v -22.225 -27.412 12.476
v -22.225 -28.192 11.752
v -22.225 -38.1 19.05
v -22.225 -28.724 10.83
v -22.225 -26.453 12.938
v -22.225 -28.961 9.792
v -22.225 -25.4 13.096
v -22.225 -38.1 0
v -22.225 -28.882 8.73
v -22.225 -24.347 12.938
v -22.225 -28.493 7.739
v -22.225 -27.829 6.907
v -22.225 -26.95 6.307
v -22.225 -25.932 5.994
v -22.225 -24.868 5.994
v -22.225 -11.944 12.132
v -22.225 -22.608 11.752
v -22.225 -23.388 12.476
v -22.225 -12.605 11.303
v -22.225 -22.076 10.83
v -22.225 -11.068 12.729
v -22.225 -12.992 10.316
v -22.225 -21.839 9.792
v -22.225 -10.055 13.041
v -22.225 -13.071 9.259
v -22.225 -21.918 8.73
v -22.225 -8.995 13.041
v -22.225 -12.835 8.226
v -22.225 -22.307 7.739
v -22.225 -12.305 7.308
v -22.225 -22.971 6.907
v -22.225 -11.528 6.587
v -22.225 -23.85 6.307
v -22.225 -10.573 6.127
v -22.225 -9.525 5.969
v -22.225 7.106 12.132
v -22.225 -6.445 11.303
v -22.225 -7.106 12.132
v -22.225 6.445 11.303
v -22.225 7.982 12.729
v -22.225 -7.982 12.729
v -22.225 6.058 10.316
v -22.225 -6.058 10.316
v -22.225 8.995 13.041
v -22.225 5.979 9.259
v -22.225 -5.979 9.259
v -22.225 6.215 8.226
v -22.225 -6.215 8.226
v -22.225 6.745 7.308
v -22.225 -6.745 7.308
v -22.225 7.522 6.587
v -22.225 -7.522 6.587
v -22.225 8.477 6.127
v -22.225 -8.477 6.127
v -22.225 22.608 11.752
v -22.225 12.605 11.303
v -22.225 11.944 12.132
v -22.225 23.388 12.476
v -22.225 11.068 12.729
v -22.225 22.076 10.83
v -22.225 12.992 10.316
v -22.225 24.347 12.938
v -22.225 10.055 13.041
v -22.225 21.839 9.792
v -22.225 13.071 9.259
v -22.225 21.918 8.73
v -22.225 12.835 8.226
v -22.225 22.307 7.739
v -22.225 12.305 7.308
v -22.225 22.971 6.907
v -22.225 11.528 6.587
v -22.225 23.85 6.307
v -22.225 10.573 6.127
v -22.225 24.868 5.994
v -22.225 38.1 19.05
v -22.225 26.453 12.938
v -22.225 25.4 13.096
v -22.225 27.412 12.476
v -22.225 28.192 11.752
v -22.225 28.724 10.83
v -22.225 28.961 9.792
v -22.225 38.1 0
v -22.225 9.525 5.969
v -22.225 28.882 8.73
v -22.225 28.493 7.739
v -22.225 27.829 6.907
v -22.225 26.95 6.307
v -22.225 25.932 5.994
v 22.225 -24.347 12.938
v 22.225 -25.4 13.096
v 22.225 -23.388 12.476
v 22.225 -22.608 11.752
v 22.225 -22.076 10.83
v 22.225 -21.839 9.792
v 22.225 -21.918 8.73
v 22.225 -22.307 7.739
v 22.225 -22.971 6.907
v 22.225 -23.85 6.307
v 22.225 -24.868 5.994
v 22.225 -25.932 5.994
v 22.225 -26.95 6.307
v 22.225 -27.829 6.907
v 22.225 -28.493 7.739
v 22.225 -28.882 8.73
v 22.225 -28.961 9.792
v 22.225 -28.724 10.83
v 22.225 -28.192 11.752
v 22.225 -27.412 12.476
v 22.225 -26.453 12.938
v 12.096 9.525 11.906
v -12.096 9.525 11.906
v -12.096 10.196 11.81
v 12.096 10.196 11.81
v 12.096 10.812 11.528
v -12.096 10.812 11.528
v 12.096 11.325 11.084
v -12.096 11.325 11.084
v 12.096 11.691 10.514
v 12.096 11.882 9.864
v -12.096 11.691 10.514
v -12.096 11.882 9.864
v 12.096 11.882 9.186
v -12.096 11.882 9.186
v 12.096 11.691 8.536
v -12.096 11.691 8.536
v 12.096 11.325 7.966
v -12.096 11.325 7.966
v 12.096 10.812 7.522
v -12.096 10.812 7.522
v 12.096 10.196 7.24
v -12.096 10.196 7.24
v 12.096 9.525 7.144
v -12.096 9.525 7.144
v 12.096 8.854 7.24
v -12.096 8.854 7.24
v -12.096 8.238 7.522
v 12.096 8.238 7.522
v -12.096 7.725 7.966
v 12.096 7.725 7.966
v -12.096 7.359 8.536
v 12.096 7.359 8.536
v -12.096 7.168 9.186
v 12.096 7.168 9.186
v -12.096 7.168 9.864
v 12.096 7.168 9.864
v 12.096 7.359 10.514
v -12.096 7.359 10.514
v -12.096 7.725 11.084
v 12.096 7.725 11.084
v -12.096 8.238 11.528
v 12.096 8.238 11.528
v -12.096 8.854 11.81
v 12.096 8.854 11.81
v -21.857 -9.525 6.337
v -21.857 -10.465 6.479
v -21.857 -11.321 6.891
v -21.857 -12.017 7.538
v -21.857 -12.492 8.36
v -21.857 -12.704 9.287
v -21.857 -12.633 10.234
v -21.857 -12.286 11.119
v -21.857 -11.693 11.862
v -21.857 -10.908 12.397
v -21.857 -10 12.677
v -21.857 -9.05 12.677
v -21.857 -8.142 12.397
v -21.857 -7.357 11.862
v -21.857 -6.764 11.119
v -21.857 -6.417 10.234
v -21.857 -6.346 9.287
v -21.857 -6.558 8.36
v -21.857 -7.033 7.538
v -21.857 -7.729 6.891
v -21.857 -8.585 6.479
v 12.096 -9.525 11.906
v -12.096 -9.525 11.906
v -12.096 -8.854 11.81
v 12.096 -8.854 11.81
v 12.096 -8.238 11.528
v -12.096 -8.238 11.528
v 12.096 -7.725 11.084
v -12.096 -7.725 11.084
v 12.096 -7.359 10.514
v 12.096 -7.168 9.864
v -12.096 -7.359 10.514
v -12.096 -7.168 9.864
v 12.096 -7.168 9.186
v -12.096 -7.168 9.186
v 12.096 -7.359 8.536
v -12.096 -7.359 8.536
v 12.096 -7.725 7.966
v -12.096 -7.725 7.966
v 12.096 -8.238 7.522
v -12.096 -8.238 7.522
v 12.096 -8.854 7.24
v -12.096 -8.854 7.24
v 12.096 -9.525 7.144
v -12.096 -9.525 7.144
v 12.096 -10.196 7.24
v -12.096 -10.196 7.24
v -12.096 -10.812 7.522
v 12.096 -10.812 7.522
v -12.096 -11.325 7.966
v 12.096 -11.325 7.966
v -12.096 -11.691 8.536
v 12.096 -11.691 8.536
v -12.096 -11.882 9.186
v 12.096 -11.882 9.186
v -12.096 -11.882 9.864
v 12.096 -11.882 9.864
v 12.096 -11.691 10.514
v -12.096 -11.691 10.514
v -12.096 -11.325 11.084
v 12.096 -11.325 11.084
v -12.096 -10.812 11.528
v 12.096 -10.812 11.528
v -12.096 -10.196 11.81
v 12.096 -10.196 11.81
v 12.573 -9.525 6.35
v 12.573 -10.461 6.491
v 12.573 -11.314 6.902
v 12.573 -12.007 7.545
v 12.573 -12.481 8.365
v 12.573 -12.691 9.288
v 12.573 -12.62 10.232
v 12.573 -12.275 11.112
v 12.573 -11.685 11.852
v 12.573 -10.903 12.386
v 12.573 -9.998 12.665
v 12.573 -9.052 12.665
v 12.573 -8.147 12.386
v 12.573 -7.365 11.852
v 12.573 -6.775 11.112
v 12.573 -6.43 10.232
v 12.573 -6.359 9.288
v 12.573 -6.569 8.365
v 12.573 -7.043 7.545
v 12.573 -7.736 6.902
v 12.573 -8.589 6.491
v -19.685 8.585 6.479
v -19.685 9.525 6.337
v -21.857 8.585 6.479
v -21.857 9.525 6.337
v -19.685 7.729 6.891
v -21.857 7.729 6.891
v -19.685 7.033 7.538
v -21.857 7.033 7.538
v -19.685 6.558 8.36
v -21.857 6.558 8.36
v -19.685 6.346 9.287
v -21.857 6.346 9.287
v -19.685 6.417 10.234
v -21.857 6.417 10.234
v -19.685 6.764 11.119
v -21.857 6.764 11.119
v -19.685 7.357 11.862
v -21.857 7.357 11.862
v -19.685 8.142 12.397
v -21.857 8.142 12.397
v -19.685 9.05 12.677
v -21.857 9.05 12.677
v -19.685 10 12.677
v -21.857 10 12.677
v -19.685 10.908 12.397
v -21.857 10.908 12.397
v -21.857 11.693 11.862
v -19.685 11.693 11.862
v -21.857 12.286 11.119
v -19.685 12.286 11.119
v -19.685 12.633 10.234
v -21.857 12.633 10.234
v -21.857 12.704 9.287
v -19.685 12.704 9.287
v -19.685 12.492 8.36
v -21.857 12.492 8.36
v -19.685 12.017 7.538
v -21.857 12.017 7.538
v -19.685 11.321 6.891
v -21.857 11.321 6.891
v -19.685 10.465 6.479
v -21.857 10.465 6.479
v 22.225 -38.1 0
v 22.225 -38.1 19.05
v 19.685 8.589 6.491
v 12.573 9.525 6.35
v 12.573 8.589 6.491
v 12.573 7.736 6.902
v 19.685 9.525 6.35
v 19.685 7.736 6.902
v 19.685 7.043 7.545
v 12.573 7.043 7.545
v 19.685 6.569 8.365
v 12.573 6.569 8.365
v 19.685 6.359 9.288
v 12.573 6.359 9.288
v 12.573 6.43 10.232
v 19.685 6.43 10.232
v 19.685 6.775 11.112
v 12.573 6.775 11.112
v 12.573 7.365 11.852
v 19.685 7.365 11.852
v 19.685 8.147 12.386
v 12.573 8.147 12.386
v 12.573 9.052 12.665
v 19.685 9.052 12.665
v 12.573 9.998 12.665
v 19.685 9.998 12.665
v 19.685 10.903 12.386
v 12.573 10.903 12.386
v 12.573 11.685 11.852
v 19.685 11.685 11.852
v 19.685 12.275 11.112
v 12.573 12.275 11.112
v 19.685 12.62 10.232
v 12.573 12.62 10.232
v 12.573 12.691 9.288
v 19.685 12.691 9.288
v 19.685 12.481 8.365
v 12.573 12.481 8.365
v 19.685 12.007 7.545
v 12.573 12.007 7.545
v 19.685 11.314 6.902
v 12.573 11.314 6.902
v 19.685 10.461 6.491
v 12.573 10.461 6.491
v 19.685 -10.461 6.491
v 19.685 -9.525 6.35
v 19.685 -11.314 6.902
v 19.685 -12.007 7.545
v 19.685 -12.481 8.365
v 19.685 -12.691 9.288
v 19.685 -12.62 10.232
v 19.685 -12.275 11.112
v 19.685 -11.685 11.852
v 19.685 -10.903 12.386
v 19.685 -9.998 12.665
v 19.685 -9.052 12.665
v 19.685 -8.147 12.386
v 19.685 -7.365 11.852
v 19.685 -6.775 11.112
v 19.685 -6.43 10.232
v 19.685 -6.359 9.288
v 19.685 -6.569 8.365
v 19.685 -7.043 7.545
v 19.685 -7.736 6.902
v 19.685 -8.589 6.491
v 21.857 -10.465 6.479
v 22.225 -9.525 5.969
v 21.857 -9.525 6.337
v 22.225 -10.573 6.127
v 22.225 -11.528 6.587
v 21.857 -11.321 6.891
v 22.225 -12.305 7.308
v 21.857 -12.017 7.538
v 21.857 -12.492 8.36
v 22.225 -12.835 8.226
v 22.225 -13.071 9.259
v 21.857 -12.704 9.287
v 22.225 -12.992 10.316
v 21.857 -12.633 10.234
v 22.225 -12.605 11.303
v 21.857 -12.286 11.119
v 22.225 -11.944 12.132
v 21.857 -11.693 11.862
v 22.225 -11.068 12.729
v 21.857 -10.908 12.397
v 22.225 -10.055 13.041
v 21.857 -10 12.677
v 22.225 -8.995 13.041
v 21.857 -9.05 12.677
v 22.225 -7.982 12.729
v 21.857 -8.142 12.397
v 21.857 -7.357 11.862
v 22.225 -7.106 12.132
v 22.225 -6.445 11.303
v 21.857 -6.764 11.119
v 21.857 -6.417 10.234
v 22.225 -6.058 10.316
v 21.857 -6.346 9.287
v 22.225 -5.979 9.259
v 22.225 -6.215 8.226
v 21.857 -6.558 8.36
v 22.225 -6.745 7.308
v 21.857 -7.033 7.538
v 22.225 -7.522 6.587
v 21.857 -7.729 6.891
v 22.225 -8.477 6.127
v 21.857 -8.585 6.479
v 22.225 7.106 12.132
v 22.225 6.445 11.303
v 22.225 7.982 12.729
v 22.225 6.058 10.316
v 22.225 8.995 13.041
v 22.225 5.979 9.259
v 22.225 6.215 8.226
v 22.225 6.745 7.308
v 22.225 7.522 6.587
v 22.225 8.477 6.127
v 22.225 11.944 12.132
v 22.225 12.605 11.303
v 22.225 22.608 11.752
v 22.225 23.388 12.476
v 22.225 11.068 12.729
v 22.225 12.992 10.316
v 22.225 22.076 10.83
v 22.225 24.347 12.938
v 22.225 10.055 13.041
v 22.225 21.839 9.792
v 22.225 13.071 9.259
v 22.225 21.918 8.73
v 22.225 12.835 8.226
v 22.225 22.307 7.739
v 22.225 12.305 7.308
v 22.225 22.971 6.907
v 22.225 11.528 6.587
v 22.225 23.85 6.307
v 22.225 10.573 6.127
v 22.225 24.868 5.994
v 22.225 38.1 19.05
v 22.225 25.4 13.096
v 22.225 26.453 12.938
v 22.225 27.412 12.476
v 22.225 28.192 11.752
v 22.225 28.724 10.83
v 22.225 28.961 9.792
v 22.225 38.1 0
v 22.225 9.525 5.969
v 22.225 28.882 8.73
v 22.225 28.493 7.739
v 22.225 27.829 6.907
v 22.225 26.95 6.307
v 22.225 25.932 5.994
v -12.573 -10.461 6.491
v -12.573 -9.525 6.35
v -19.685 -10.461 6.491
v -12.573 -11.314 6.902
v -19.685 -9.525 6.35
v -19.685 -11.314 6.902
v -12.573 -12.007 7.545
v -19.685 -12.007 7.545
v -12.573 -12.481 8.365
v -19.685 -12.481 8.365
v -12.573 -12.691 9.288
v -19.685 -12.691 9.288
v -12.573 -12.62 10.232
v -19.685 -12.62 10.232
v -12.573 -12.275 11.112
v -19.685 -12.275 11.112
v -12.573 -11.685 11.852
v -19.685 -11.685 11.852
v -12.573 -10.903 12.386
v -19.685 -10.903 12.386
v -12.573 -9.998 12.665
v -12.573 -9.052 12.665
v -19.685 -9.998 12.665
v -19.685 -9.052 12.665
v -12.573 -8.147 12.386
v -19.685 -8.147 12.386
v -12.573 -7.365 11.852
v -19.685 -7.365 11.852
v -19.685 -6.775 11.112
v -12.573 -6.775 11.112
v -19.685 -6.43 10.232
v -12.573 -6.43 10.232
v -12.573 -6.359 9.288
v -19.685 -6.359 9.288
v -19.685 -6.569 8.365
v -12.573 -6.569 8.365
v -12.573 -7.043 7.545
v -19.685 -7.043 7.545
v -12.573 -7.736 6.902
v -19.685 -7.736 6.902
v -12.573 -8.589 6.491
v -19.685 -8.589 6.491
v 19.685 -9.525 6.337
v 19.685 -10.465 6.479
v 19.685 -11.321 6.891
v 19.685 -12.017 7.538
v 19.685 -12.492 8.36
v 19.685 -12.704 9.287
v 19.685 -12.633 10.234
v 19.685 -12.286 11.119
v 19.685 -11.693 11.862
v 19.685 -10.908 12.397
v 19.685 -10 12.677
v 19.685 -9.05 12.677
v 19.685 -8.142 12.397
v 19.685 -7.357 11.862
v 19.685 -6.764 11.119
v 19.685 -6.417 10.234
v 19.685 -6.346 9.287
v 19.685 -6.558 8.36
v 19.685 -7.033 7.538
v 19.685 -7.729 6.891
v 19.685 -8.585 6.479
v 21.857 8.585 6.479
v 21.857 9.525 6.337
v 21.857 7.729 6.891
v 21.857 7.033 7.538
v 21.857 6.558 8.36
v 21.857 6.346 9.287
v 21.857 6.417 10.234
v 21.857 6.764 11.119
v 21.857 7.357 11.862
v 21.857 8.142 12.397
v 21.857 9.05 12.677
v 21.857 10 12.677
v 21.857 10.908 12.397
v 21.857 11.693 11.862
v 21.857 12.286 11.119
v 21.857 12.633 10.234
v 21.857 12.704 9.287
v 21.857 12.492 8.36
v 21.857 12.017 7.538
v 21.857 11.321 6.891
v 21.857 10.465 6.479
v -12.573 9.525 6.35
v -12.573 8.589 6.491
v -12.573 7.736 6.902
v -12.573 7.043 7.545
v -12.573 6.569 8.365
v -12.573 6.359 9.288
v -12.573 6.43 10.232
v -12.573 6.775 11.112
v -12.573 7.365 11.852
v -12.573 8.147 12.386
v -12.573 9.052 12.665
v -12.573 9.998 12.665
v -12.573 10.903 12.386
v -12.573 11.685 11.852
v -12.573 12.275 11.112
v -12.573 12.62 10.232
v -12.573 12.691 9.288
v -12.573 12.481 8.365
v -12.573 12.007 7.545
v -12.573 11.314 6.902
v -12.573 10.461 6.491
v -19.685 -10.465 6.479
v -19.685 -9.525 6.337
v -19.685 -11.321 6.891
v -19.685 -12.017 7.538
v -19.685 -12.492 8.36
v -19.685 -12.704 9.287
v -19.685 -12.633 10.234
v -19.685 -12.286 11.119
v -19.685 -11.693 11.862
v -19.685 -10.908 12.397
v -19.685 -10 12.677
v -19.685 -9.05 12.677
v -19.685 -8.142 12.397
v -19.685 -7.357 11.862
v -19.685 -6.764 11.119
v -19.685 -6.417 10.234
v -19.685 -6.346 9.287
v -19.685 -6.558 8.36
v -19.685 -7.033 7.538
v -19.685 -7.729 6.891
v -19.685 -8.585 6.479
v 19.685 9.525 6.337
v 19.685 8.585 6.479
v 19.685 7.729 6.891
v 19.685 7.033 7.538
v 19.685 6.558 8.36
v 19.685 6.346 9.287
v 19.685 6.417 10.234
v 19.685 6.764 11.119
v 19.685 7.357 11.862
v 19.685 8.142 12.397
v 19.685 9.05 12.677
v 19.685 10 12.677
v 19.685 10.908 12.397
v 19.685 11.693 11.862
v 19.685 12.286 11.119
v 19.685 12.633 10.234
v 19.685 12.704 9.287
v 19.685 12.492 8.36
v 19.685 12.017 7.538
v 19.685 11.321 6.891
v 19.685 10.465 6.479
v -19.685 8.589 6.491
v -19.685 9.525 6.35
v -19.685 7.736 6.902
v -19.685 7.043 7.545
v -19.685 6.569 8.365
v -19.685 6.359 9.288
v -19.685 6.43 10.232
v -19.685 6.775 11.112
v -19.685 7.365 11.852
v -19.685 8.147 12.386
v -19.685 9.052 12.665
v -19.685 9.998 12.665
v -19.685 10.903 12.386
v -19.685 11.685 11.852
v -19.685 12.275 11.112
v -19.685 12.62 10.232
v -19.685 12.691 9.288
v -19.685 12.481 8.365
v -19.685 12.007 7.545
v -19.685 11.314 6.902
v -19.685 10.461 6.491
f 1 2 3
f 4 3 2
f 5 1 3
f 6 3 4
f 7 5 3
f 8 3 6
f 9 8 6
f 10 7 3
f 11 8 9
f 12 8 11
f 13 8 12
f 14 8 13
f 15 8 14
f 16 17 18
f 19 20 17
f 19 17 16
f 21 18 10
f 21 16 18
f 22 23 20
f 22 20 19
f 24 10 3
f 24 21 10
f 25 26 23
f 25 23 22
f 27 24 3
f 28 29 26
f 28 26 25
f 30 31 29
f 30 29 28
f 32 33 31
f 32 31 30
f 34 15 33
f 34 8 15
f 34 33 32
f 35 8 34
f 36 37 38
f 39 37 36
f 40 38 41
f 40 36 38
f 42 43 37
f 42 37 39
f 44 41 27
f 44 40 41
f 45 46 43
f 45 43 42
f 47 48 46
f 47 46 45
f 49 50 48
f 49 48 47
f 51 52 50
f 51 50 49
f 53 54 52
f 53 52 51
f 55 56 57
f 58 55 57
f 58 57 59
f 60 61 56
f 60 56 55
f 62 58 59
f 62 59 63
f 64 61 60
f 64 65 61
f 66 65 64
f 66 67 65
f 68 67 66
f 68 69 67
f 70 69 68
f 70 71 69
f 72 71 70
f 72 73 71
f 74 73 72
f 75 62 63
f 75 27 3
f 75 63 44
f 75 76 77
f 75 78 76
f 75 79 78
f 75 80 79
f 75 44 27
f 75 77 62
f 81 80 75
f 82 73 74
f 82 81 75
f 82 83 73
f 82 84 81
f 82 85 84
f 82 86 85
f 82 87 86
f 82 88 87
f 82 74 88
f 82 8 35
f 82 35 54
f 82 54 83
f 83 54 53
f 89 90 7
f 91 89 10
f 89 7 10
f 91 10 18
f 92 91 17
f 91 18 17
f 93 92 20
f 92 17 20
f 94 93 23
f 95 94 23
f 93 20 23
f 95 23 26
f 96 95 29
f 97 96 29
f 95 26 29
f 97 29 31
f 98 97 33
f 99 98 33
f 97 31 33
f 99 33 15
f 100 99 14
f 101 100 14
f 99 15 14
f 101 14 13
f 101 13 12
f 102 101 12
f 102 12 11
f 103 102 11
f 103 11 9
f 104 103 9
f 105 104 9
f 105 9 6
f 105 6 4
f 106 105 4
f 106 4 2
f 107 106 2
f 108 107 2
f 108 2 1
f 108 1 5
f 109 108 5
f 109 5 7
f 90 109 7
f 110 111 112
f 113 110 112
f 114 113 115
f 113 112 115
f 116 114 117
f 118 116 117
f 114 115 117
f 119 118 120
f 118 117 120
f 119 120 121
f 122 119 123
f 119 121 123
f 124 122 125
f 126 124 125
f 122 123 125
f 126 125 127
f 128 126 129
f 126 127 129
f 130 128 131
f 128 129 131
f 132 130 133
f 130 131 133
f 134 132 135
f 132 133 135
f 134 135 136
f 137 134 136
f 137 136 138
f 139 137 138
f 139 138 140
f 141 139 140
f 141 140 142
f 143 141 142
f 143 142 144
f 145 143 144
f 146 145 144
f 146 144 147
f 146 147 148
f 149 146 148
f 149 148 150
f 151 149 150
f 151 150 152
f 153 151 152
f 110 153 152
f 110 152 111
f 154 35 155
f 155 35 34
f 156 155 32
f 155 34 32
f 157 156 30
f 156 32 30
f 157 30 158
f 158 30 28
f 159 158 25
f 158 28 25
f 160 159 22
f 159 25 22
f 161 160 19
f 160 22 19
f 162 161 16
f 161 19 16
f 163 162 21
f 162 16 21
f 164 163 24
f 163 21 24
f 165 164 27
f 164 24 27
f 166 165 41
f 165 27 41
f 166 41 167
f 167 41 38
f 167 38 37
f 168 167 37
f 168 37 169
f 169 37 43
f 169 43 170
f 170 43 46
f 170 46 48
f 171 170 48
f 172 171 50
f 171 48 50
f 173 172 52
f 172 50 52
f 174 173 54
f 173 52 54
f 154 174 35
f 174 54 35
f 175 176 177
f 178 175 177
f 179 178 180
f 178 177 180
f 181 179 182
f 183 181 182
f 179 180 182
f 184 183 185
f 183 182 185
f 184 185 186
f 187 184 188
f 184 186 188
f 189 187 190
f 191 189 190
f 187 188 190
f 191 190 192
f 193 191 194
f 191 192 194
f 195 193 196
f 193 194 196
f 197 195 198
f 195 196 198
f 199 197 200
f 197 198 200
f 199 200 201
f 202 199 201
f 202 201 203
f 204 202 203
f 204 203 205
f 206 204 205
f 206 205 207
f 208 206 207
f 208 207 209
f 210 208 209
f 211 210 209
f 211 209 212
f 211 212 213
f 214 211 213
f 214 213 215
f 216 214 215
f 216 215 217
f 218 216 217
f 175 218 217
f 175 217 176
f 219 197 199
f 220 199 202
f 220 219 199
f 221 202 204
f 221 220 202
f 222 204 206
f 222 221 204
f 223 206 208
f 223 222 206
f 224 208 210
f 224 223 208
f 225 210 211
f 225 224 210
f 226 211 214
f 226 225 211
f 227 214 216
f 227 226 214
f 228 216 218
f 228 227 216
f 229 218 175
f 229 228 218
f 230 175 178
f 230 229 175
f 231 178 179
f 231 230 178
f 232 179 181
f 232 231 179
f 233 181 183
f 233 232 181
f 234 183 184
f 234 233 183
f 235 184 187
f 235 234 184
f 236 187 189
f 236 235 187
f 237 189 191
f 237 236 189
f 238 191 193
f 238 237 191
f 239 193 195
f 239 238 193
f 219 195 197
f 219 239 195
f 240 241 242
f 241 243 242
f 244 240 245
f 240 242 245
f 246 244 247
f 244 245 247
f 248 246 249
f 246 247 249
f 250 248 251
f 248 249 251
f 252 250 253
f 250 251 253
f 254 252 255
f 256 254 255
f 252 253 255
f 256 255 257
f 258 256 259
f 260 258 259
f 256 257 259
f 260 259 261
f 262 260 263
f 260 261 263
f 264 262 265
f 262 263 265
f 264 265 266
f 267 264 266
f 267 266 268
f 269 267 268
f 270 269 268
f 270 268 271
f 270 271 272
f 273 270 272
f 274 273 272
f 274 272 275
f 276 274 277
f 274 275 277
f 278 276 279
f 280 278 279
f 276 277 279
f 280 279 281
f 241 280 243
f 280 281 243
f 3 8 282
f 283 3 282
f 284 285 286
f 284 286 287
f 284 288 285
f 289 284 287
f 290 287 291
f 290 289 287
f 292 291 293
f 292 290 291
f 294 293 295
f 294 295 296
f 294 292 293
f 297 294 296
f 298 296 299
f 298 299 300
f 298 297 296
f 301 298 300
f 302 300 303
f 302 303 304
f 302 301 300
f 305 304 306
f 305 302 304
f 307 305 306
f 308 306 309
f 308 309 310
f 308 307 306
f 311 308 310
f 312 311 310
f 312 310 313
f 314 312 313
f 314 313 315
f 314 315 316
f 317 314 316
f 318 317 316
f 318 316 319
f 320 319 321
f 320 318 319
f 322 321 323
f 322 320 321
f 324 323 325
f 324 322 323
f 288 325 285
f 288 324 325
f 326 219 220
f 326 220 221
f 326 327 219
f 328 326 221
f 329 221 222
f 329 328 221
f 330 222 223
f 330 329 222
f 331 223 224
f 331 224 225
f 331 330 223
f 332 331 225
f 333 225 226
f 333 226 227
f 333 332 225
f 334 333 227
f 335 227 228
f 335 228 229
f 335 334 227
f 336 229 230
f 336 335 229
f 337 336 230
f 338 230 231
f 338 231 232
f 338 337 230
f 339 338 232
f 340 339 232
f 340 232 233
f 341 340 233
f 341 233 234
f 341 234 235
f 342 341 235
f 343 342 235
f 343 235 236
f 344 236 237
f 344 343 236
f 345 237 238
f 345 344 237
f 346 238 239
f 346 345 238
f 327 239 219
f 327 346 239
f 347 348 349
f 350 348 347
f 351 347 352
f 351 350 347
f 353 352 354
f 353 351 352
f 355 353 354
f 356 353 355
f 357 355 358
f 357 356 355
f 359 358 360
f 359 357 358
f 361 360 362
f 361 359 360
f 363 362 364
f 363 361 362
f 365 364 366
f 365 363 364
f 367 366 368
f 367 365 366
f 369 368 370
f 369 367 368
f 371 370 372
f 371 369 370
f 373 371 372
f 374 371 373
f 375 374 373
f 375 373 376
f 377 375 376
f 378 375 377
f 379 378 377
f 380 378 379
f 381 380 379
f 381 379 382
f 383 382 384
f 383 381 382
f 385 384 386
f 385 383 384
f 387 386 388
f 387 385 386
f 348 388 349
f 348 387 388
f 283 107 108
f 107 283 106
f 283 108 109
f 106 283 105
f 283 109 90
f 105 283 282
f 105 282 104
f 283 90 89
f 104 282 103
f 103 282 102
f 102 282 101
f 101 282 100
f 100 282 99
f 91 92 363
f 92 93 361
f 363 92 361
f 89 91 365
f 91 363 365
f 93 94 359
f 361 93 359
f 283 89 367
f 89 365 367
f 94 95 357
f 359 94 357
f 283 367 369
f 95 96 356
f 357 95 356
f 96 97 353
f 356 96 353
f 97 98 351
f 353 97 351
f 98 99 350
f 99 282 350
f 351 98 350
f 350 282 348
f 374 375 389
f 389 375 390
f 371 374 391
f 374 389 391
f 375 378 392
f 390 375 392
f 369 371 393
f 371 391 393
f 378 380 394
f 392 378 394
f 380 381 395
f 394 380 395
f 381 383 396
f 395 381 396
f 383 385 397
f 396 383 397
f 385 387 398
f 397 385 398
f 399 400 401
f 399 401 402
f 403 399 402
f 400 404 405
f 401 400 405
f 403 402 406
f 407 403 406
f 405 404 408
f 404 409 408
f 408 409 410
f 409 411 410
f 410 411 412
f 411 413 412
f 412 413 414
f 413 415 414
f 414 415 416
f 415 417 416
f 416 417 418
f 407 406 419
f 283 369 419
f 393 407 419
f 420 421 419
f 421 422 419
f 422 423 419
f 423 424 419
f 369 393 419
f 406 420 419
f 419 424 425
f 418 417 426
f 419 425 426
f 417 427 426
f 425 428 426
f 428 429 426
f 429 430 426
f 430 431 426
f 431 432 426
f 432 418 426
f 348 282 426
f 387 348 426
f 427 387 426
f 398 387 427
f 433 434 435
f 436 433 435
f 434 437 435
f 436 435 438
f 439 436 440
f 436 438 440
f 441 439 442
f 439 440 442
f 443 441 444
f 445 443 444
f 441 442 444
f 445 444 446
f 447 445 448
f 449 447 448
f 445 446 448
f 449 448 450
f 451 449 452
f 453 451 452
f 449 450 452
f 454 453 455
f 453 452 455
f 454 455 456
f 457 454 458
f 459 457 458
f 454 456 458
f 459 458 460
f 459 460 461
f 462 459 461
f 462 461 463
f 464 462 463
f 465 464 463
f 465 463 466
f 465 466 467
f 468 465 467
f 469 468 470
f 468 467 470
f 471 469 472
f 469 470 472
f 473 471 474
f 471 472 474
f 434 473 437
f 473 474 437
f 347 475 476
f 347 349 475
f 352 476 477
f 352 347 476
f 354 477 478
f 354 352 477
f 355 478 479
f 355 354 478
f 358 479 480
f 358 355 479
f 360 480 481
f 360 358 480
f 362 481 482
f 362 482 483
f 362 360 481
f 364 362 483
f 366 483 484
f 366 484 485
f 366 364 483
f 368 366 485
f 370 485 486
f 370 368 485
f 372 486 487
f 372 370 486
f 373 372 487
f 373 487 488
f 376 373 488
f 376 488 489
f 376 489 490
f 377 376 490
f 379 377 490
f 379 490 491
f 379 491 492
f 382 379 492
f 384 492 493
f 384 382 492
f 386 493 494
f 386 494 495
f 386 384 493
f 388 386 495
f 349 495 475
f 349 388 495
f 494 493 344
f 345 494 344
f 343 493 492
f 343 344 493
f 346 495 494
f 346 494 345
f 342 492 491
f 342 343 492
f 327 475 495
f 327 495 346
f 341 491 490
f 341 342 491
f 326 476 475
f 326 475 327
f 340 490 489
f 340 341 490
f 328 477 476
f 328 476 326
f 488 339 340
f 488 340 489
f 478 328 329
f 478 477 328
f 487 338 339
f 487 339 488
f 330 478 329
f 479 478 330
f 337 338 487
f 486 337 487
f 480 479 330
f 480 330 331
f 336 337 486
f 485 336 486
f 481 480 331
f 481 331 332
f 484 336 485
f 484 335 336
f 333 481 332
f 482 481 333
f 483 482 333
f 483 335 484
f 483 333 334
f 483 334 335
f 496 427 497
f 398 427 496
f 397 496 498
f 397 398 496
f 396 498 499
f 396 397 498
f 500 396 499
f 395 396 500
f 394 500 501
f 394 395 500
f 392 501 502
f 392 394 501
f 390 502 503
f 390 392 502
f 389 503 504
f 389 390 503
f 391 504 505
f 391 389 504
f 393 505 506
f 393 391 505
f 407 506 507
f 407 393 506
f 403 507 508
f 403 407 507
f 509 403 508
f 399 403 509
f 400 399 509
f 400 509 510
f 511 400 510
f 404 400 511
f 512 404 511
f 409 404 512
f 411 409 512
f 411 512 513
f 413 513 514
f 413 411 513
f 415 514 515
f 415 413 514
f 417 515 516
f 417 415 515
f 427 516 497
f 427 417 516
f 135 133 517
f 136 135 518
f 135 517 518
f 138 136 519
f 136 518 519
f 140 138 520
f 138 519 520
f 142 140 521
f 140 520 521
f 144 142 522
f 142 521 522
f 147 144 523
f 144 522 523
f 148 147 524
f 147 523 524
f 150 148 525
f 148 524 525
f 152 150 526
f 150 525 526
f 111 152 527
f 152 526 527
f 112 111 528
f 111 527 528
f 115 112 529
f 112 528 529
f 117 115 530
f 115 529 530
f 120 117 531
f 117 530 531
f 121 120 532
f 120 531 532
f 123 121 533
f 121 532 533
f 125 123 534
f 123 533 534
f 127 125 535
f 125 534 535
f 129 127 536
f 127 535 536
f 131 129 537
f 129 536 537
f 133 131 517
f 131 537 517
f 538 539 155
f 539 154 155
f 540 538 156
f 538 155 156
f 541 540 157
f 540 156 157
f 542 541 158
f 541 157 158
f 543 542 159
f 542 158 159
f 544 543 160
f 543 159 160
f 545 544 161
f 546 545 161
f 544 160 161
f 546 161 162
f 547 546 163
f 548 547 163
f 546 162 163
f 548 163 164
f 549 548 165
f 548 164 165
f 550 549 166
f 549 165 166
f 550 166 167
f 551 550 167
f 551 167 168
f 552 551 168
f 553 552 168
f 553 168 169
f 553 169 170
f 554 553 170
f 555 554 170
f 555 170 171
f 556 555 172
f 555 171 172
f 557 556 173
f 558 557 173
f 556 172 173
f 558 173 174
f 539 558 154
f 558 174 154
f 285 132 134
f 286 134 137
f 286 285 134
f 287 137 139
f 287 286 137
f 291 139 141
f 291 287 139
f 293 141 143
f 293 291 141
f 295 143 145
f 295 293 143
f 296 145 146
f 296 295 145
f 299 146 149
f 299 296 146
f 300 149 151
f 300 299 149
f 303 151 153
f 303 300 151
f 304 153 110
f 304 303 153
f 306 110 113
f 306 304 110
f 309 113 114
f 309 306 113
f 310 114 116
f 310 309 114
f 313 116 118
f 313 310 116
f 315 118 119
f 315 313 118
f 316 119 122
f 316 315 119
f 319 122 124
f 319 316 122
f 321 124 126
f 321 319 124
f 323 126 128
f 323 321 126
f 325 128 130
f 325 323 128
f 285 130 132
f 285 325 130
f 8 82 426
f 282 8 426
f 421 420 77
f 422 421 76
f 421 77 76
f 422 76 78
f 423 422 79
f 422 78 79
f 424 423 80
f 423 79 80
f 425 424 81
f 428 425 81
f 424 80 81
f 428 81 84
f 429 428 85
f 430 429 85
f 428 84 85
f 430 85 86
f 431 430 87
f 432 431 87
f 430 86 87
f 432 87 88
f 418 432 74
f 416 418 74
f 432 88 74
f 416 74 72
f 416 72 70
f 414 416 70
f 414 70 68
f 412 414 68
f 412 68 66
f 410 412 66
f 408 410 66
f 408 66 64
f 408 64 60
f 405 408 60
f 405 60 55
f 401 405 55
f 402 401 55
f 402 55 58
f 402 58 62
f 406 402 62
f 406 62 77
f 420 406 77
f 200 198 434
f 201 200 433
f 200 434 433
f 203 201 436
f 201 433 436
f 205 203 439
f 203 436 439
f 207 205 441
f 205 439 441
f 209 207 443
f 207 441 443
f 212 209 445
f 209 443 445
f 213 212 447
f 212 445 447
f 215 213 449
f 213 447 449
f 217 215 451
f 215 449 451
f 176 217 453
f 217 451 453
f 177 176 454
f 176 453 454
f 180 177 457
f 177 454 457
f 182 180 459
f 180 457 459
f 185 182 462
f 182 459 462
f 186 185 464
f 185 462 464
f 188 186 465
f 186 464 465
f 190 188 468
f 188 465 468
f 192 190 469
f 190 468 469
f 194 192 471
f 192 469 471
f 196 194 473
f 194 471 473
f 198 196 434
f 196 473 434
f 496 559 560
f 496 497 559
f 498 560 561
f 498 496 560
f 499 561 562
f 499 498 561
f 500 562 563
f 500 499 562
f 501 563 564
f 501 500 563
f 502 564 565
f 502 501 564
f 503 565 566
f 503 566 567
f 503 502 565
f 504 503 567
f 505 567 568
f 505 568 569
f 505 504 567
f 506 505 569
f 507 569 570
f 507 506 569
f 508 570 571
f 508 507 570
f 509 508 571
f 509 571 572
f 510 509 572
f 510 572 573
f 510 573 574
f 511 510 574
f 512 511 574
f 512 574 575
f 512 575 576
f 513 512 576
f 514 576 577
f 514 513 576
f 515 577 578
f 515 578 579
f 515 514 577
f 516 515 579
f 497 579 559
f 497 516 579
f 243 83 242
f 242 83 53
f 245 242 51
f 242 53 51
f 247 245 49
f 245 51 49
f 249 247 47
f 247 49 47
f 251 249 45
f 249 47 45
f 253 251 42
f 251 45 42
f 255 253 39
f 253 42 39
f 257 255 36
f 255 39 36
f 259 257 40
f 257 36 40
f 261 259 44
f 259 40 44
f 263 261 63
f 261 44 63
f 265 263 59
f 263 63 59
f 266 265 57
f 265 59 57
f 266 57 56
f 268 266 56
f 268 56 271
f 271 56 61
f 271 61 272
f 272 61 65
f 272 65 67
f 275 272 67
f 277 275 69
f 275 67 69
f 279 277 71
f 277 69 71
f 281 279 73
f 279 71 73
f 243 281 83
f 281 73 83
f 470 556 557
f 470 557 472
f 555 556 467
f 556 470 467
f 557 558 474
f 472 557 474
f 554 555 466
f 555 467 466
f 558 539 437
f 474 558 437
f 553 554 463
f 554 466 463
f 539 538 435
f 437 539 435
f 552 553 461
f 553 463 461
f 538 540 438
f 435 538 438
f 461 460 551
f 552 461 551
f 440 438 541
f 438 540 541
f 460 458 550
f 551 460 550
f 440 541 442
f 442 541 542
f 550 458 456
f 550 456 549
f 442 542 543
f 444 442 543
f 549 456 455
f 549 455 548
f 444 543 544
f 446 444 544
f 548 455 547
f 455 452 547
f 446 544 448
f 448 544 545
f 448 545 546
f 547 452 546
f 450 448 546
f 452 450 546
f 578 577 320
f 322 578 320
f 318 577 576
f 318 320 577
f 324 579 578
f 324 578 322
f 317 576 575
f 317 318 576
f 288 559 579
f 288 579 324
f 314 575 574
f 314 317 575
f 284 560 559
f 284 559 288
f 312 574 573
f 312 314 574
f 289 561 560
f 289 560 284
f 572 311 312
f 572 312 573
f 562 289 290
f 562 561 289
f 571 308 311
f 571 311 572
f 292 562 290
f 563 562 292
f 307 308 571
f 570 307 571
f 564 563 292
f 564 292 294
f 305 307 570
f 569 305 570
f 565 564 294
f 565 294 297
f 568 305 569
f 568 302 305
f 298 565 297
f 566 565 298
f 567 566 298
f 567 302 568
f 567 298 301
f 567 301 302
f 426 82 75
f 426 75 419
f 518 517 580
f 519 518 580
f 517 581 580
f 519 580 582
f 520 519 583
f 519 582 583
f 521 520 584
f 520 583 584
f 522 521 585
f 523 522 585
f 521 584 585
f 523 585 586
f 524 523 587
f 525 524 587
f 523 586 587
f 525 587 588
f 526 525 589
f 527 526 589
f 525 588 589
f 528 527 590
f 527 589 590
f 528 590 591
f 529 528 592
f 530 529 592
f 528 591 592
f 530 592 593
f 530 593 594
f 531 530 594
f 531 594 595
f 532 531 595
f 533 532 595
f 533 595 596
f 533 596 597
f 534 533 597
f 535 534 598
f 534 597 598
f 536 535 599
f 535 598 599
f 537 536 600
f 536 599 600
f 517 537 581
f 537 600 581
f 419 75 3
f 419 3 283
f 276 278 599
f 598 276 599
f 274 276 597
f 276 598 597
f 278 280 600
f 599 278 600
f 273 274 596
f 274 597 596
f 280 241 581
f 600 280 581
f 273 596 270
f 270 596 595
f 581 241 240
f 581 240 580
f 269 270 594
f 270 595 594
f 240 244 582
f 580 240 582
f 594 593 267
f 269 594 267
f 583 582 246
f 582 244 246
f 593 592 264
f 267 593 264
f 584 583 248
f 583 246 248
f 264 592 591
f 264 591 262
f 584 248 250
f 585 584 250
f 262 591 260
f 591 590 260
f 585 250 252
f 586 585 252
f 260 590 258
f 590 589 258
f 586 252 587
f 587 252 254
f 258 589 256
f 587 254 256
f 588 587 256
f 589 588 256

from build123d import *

# Parameters (mm, degrees)
SKETCH1_W                      = 44.45
SKETCH1_H                      = 76.2
EXTRUDE1_DEPTH                 = 19.05
F_1_4_CLEARANCE_HOLE1_D        = 7.14248
CBORE_FOR_1_4_DOWEL_AT_2_COUNT = 2
CBORE_FOR_1_4_DOWEL_AT_2_PITCH = 19.05
F_3_16_0_1875_DIAMETER_HOLE1_D = 4.7625


with BuildPart() as part:
    # Sketch1 → Extrude1 (new body)
    with BuildSketch(Plane.XY):
        Rectangle(SKETCH1_W, SKETCH1_H)
    extrude(amount=EXTRUDE1_DEPTH)

    # 1/4 Clearance Hole1 (through all)
    with Locations(Plane(origin=(22.225, 0, 0), x_dir=(0, 0, -1), z_dir=(1, 0, 0))):
        with Locations((-9.525, 25.4), (-9.525, -25.4)):
            Hole(F_1_4_CLEARANCE_HOLE1_D / 2)

    # Sketch4 → CBORE for 1/4 DOWEL (revolve, cut)
    with BuildSketch(Plane(origin=(22.225, -9.525, 9.525), x_dir=(0, 0, -1), z_dir=(0, 1, 0))):
        Polygon((0, 0), (0, 11.559732465), (3.175, 9.652), (3.175, 2.54), (3.1877, 2.54), (3.1877, 0.3683), (3.556, 0), align=None)
    cbore_for_1_4_dowel = revolve(axis=Axis((28.575, -9.525, 9.525), (-1, 0, 0)), mode=Mode.SUBTRACT)

    # CBORE for 1/4 DOWEL at 2: CBORE for 1/4 DOWEL ×2
    with Locations(*[(0, i * CBORE_FOR_1_4_DOWEL_AT_2_PITCH, 0) for i in range(1, CBORE_FOR_1_4_DOWEL_AT_2_COUNT)]):
        add(cbore_for_1_4_dowel, mode=Mode.SUBTRACT)

    # 3/16 (0.1875) Diameter Hole1 (through all)
    with Locations(Plane(origin=(22.225, 0, 0), x_dir=(0, 0, -1), z_dir=(1, 0, 0))):
        with Locations((-9.525, 9.525), (-9.525, -9.525)):
            Hole(F_3_16_0_1875_DIAMETER_HOLE1_D / 2)

    # Mirror1: CBORE for 1/4 DOWEL across plane
    add(cbore_for_1_4_dowel.mirror(Plane(origin=(0, 0, 0), x_dir=(0, 0, 1), z_dir=(1, 0, 0))), mode=Mode.SUBTRACT)

    # Mirror1 copy 1 sketch → Mirror1 copy 1 (revolve, cut)
    with BuildSketch(Plane(origin=(-22.225, 9.525, 9.525), x_dir=(0, 0, -1), z_dir=(0, 1, 0))):
        Polygon((0, 0), (0, -11.559732465), (3.175, -9.652), (3.175, -2.54), (3.1877, -2.54), (3.1877, -0.3683), (3.556, 0), align=None)
    revolve(axis=Axis((-28.575, 9.525, 9.525), (-1, 0, 0)), mode=Mode.SUBTRACT)


solid = part.part
